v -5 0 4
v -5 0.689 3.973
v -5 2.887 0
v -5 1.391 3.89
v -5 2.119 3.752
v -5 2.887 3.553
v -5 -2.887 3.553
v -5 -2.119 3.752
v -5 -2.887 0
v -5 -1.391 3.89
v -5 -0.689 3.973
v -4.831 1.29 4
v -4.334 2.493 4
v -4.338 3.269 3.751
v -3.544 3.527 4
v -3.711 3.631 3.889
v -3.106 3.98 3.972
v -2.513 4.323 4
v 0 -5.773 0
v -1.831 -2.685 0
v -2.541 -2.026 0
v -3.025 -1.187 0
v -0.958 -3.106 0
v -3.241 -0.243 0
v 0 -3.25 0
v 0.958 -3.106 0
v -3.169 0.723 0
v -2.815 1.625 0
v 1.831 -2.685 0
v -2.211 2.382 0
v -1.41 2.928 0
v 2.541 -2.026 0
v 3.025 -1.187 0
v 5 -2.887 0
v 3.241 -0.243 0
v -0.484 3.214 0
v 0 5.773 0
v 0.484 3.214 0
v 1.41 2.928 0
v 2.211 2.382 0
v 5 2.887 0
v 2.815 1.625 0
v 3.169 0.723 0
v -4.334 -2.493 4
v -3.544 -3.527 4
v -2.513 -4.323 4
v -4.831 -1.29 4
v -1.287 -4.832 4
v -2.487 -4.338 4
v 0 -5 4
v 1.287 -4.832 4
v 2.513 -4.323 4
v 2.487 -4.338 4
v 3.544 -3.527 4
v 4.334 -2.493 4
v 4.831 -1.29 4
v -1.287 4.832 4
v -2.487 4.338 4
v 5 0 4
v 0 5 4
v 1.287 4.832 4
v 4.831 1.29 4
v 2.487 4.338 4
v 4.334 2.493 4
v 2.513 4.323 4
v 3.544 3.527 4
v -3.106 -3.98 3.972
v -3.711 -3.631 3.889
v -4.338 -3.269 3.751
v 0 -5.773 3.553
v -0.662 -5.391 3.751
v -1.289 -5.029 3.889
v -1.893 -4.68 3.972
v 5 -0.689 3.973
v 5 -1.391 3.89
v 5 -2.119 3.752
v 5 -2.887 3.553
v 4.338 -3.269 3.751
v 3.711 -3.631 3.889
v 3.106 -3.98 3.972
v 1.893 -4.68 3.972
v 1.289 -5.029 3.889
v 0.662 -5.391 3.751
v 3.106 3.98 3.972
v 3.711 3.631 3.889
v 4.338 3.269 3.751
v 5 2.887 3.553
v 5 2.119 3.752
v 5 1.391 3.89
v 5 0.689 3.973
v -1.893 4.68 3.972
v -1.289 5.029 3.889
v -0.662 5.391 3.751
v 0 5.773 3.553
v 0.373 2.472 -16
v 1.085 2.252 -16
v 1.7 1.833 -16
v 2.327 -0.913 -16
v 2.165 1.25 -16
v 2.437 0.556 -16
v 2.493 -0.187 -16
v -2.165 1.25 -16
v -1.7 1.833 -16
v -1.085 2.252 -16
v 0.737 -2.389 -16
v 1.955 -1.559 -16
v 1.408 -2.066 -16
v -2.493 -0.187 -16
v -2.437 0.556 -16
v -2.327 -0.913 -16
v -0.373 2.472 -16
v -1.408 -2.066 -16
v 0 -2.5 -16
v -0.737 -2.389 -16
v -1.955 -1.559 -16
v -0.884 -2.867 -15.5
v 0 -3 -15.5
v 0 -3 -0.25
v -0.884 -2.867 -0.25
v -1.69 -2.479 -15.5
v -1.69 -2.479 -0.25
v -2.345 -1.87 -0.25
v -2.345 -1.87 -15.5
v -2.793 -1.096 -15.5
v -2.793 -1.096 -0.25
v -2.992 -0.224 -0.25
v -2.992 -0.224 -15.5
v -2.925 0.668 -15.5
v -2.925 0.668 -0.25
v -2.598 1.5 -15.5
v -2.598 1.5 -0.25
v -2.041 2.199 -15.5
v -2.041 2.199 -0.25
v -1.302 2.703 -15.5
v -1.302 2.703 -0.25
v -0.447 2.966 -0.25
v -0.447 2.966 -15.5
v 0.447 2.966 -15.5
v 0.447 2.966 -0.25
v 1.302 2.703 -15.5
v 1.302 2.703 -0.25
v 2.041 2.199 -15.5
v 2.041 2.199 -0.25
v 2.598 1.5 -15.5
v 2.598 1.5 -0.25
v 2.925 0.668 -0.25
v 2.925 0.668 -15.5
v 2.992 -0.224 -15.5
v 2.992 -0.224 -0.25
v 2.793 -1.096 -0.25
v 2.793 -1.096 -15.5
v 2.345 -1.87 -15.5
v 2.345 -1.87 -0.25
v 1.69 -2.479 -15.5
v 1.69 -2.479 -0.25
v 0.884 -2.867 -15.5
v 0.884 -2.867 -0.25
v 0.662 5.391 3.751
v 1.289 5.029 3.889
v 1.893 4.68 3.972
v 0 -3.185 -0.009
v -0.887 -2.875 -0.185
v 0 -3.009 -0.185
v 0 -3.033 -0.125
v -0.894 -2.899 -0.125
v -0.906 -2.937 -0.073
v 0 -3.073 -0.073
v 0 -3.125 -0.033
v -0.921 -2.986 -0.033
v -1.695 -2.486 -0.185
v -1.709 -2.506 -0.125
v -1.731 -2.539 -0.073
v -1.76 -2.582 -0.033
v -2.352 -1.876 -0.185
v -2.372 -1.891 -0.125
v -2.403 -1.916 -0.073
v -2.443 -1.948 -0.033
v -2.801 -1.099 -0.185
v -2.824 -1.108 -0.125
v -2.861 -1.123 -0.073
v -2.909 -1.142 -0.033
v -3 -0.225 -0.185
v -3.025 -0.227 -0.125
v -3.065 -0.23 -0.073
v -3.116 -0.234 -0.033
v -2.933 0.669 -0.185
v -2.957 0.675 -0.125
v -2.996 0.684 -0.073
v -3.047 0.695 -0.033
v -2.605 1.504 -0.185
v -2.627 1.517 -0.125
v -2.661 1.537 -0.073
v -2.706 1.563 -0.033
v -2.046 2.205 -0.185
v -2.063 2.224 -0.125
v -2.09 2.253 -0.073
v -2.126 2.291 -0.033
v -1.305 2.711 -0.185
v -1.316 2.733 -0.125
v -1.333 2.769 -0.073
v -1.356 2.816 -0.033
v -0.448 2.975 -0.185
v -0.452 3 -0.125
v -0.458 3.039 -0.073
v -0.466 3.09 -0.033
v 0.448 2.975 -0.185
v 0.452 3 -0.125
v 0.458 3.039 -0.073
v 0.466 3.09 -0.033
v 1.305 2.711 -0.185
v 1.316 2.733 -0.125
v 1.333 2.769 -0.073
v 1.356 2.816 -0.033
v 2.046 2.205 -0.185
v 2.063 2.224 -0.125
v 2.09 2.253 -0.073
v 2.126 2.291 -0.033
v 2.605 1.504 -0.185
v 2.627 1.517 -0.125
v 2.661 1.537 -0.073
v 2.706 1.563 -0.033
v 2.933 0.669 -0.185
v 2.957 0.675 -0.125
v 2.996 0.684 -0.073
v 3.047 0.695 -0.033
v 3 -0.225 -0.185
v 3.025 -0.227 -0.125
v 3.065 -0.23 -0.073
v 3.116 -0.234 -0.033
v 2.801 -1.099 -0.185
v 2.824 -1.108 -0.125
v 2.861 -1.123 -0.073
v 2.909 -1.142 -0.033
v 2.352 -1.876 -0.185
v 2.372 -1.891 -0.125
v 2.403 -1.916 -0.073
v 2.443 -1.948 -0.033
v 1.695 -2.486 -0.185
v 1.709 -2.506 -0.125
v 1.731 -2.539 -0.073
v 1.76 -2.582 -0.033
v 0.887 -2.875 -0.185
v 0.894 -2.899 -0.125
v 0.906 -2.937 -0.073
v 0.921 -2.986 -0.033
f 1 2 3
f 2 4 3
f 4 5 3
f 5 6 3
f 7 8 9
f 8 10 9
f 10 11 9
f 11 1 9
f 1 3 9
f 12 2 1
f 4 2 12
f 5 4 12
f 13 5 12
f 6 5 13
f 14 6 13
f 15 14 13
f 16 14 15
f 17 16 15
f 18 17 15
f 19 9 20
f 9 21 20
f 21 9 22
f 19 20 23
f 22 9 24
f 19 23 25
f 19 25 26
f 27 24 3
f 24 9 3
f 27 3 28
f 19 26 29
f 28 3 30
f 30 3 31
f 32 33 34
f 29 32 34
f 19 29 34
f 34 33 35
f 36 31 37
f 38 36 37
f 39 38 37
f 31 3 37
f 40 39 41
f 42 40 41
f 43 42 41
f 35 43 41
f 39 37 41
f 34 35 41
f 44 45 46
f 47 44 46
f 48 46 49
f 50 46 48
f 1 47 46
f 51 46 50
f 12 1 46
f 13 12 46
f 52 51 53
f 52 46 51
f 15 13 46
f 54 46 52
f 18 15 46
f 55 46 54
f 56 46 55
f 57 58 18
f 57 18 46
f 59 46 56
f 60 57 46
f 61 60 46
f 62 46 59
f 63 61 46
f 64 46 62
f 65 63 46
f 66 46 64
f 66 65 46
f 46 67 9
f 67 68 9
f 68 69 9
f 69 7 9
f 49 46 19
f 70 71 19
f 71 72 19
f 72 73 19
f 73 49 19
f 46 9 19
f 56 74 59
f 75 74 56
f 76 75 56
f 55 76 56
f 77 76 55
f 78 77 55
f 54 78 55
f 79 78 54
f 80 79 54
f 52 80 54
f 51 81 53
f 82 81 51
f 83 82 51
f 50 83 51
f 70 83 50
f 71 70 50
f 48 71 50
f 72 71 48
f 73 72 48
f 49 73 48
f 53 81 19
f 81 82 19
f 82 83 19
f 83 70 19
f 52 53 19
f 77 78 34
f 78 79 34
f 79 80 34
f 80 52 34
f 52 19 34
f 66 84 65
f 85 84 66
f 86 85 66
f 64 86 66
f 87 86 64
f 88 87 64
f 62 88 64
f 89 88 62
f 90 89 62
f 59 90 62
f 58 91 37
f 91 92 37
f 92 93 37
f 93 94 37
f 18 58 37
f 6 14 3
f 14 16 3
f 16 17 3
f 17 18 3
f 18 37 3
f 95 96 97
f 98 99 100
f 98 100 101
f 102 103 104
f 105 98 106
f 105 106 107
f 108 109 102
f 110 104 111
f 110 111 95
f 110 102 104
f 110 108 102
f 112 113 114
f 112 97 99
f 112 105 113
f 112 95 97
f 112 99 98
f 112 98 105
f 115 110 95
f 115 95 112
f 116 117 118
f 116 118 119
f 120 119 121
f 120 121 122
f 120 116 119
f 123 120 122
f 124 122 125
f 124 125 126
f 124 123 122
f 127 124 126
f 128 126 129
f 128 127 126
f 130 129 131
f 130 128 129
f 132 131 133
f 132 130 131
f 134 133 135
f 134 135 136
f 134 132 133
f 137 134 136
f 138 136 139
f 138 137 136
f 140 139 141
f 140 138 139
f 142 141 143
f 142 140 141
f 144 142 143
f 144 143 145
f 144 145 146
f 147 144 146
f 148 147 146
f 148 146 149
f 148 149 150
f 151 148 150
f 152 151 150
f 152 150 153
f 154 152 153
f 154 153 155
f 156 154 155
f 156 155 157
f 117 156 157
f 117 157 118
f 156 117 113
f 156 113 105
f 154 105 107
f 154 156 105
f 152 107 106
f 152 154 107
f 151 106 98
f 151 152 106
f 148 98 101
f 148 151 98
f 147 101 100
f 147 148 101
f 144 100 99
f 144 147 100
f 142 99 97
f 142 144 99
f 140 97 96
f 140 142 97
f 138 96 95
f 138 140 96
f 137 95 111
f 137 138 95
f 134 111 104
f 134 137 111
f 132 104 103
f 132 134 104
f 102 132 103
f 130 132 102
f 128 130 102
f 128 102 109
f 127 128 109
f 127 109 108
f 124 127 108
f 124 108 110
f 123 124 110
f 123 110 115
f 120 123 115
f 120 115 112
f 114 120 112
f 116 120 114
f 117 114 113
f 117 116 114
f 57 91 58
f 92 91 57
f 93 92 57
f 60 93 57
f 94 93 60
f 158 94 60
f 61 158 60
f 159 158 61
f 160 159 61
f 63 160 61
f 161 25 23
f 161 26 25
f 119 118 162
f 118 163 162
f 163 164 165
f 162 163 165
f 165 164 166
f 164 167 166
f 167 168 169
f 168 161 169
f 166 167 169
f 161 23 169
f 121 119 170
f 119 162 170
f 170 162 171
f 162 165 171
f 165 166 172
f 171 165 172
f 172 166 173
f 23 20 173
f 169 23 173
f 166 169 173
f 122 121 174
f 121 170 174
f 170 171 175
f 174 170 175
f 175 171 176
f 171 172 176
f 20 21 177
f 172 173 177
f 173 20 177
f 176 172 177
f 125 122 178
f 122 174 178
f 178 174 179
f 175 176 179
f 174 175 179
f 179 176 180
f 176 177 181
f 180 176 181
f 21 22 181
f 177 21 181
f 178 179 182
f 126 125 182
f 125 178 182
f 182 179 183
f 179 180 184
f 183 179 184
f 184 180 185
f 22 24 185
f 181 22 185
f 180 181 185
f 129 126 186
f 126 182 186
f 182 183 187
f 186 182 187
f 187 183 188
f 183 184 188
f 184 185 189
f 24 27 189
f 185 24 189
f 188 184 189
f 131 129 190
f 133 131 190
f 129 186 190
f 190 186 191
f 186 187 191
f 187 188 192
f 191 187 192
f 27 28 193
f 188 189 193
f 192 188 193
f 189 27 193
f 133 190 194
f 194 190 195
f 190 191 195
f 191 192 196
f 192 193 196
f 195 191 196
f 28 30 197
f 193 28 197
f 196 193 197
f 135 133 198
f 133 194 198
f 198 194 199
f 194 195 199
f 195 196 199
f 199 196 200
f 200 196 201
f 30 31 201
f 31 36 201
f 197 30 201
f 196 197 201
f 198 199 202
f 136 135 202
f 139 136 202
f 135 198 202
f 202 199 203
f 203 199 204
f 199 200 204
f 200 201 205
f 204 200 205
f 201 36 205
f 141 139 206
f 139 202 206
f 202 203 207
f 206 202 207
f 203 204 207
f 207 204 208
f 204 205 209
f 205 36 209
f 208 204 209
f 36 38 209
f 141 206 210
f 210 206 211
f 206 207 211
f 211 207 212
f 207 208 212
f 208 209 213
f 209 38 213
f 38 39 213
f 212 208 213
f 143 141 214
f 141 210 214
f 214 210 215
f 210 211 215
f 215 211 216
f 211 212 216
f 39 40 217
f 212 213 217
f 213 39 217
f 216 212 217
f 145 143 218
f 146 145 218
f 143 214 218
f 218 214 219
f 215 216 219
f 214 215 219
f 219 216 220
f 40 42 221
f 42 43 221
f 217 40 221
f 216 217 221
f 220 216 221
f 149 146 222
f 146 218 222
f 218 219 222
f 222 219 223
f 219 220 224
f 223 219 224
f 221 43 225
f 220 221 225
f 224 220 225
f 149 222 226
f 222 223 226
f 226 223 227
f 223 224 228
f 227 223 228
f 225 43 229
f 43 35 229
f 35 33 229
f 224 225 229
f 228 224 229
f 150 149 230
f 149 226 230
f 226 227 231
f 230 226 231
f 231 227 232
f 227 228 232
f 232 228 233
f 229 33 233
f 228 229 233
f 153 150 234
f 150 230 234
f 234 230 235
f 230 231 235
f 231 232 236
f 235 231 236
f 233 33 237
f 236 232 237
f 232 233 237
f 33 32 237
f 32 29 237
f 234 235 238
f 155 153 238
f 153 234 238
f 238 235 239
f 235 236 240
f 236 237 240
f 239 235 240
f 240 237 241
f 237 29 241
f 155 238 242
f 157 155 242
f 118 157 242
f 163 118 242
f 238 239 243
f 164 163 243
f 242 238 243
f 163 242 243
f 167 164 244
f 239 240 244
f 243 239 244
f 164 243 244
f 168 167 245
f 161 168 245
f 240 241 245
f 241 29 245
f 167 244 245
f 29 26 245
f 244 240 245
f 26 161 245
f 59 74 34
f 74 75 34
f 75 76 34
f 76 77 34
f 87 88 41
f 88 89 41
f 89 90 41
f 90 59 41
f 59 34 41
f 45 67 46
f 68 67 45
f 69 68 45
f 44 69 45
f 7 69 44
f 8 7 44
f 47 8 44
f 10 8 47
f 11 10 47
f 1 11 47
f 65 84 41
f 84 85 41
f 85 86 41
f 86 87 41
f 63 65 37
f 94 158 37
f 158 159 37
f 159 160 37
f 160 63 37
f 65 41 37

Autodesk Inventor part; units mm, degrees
ref_plane "WorkPlane1" through (0, 0, 0) normal (0, 0, 1) x (1, 0, 0)
sketch "Sketch1" plane through (0, 0, 0) normal (0, 0, 1) x (1, 0, 0)
  point P0 (0, 0)
sketch "Sketch2" plane through (0, 0, 0) normal (0, 0, 1) x (1, 0, 0)
  line L0 (-5, 2.8868) -> (-5, -2.8868)
  line L1 (0, 5.7734) -> (-5, 2.8868)
  line L2 (5, 2.8868) -> (0, 5.7734)
  line L3 (5, -2.8868) -> (5, 2.8868)
  line L4 (0, -5.7734) -> (5, -2.8868)
  line L5 (-5, -2.8868) -> (0, -5.7734)
  circle A0 centre (0, 0) radius 5 construction
  dimension "d1" = 10
  dimension "d29" = 0
  dimension "d30" = 0
extrude "Extrusion1" add sketch "Sketch2" along normal blind 4
sketch "Sketch3" plane through (0, 0, 0) normal (1, 0, 0) x (0, 1, 0)
  line L0 (5, 4) -> (5.8734, 4)
  line L1 (5.8734, 3.4957) -> (5, 4)
  line L2 (5.8734, 4) -> (5.8734, 3.4957)
  line L3 (0, -0.8) -> (0, 4.8) projected
  line L4 (5.7734, 0) -> (5.7734, 4) projected
  dimension "d25" = 0.1
  dimension "d26" = 0
  dimension "d27" = 60
  dimension "d28" = 5
revolve "Revolution1" cut sketch "Sketch3" angle 360 about axis through (0, 0, -10) along (0, 0, 1)
sketch "Sketch4" plane through (0, 0, 0) normal (1, 0, 0) x (0, 1, 0)
  line L0 (0, -16) -> (0, 0)
  line L1 (-3, -16) -> (0, -16)
  line L2 (-3, 0) -> (-3, -16)
  line L3 (0, 0) -> (-3, 0)
  line L4 (0, -16) -> (0, 0)
  line L5 (-3.6, 0) -> (0.6, 0) projected
  line L6 (0, -19.2) -> (0, 3.2) projected
  dimension "d18" = 3
  dimension "d20" = 16
  dimension "d33" = 0
  dimension "d34" = 0
revolve "Revolution2" add sketch "Sketch4" angle 360 about axis through (0, 0, -16) along (0, 0, -1)
chamfer "Chamfer1" distance 0.5 angle 45 1 edges at (0, 3, -16)
fillet "Fillet1" radius 0.25 1 edges at (0, 3, 0)
thread "Thread1" size "M6x1" class "6g" standard "ISO Metric profile" length 14
ref_plane "MSC_PF1" through (0, 0, 0) normal (1, 0, 0) x (0, 1, 0)
ref_plane "MSC_PT1" through (0, 0, 0) normal (0, 0, -1) x (-1, 0, 0)
equation "\"d22\" = 0.5 * PTC"
equation "\"d23\" = 0.5 * PTC"
equation "\"d24\" = r"
equation "\"d1\" = ParS"
equation "\"d6\" = ParK"
equation "\"b\" = NLG - 2 * PTC"
equation "\"d28\" = 0.5 * ParS"
equation "\"d18\" = 0.5 * NND"
equation "\"d20\" = NLG"
equation "\"NND\" = 6"
equation "\"NLG\" = 16"
equation "\"PTC\" = 1"
equation "\"ParK\" = 4"
equation "\"ParS\" = 10"
equation "\"msp_es\" = 0.577367 * ParS"
equation "\"r\" = 0.25"
equation "\"THREADDIA\" = NND"
properties part number "ISO 4018 - M6 x 16" material "Steel"
